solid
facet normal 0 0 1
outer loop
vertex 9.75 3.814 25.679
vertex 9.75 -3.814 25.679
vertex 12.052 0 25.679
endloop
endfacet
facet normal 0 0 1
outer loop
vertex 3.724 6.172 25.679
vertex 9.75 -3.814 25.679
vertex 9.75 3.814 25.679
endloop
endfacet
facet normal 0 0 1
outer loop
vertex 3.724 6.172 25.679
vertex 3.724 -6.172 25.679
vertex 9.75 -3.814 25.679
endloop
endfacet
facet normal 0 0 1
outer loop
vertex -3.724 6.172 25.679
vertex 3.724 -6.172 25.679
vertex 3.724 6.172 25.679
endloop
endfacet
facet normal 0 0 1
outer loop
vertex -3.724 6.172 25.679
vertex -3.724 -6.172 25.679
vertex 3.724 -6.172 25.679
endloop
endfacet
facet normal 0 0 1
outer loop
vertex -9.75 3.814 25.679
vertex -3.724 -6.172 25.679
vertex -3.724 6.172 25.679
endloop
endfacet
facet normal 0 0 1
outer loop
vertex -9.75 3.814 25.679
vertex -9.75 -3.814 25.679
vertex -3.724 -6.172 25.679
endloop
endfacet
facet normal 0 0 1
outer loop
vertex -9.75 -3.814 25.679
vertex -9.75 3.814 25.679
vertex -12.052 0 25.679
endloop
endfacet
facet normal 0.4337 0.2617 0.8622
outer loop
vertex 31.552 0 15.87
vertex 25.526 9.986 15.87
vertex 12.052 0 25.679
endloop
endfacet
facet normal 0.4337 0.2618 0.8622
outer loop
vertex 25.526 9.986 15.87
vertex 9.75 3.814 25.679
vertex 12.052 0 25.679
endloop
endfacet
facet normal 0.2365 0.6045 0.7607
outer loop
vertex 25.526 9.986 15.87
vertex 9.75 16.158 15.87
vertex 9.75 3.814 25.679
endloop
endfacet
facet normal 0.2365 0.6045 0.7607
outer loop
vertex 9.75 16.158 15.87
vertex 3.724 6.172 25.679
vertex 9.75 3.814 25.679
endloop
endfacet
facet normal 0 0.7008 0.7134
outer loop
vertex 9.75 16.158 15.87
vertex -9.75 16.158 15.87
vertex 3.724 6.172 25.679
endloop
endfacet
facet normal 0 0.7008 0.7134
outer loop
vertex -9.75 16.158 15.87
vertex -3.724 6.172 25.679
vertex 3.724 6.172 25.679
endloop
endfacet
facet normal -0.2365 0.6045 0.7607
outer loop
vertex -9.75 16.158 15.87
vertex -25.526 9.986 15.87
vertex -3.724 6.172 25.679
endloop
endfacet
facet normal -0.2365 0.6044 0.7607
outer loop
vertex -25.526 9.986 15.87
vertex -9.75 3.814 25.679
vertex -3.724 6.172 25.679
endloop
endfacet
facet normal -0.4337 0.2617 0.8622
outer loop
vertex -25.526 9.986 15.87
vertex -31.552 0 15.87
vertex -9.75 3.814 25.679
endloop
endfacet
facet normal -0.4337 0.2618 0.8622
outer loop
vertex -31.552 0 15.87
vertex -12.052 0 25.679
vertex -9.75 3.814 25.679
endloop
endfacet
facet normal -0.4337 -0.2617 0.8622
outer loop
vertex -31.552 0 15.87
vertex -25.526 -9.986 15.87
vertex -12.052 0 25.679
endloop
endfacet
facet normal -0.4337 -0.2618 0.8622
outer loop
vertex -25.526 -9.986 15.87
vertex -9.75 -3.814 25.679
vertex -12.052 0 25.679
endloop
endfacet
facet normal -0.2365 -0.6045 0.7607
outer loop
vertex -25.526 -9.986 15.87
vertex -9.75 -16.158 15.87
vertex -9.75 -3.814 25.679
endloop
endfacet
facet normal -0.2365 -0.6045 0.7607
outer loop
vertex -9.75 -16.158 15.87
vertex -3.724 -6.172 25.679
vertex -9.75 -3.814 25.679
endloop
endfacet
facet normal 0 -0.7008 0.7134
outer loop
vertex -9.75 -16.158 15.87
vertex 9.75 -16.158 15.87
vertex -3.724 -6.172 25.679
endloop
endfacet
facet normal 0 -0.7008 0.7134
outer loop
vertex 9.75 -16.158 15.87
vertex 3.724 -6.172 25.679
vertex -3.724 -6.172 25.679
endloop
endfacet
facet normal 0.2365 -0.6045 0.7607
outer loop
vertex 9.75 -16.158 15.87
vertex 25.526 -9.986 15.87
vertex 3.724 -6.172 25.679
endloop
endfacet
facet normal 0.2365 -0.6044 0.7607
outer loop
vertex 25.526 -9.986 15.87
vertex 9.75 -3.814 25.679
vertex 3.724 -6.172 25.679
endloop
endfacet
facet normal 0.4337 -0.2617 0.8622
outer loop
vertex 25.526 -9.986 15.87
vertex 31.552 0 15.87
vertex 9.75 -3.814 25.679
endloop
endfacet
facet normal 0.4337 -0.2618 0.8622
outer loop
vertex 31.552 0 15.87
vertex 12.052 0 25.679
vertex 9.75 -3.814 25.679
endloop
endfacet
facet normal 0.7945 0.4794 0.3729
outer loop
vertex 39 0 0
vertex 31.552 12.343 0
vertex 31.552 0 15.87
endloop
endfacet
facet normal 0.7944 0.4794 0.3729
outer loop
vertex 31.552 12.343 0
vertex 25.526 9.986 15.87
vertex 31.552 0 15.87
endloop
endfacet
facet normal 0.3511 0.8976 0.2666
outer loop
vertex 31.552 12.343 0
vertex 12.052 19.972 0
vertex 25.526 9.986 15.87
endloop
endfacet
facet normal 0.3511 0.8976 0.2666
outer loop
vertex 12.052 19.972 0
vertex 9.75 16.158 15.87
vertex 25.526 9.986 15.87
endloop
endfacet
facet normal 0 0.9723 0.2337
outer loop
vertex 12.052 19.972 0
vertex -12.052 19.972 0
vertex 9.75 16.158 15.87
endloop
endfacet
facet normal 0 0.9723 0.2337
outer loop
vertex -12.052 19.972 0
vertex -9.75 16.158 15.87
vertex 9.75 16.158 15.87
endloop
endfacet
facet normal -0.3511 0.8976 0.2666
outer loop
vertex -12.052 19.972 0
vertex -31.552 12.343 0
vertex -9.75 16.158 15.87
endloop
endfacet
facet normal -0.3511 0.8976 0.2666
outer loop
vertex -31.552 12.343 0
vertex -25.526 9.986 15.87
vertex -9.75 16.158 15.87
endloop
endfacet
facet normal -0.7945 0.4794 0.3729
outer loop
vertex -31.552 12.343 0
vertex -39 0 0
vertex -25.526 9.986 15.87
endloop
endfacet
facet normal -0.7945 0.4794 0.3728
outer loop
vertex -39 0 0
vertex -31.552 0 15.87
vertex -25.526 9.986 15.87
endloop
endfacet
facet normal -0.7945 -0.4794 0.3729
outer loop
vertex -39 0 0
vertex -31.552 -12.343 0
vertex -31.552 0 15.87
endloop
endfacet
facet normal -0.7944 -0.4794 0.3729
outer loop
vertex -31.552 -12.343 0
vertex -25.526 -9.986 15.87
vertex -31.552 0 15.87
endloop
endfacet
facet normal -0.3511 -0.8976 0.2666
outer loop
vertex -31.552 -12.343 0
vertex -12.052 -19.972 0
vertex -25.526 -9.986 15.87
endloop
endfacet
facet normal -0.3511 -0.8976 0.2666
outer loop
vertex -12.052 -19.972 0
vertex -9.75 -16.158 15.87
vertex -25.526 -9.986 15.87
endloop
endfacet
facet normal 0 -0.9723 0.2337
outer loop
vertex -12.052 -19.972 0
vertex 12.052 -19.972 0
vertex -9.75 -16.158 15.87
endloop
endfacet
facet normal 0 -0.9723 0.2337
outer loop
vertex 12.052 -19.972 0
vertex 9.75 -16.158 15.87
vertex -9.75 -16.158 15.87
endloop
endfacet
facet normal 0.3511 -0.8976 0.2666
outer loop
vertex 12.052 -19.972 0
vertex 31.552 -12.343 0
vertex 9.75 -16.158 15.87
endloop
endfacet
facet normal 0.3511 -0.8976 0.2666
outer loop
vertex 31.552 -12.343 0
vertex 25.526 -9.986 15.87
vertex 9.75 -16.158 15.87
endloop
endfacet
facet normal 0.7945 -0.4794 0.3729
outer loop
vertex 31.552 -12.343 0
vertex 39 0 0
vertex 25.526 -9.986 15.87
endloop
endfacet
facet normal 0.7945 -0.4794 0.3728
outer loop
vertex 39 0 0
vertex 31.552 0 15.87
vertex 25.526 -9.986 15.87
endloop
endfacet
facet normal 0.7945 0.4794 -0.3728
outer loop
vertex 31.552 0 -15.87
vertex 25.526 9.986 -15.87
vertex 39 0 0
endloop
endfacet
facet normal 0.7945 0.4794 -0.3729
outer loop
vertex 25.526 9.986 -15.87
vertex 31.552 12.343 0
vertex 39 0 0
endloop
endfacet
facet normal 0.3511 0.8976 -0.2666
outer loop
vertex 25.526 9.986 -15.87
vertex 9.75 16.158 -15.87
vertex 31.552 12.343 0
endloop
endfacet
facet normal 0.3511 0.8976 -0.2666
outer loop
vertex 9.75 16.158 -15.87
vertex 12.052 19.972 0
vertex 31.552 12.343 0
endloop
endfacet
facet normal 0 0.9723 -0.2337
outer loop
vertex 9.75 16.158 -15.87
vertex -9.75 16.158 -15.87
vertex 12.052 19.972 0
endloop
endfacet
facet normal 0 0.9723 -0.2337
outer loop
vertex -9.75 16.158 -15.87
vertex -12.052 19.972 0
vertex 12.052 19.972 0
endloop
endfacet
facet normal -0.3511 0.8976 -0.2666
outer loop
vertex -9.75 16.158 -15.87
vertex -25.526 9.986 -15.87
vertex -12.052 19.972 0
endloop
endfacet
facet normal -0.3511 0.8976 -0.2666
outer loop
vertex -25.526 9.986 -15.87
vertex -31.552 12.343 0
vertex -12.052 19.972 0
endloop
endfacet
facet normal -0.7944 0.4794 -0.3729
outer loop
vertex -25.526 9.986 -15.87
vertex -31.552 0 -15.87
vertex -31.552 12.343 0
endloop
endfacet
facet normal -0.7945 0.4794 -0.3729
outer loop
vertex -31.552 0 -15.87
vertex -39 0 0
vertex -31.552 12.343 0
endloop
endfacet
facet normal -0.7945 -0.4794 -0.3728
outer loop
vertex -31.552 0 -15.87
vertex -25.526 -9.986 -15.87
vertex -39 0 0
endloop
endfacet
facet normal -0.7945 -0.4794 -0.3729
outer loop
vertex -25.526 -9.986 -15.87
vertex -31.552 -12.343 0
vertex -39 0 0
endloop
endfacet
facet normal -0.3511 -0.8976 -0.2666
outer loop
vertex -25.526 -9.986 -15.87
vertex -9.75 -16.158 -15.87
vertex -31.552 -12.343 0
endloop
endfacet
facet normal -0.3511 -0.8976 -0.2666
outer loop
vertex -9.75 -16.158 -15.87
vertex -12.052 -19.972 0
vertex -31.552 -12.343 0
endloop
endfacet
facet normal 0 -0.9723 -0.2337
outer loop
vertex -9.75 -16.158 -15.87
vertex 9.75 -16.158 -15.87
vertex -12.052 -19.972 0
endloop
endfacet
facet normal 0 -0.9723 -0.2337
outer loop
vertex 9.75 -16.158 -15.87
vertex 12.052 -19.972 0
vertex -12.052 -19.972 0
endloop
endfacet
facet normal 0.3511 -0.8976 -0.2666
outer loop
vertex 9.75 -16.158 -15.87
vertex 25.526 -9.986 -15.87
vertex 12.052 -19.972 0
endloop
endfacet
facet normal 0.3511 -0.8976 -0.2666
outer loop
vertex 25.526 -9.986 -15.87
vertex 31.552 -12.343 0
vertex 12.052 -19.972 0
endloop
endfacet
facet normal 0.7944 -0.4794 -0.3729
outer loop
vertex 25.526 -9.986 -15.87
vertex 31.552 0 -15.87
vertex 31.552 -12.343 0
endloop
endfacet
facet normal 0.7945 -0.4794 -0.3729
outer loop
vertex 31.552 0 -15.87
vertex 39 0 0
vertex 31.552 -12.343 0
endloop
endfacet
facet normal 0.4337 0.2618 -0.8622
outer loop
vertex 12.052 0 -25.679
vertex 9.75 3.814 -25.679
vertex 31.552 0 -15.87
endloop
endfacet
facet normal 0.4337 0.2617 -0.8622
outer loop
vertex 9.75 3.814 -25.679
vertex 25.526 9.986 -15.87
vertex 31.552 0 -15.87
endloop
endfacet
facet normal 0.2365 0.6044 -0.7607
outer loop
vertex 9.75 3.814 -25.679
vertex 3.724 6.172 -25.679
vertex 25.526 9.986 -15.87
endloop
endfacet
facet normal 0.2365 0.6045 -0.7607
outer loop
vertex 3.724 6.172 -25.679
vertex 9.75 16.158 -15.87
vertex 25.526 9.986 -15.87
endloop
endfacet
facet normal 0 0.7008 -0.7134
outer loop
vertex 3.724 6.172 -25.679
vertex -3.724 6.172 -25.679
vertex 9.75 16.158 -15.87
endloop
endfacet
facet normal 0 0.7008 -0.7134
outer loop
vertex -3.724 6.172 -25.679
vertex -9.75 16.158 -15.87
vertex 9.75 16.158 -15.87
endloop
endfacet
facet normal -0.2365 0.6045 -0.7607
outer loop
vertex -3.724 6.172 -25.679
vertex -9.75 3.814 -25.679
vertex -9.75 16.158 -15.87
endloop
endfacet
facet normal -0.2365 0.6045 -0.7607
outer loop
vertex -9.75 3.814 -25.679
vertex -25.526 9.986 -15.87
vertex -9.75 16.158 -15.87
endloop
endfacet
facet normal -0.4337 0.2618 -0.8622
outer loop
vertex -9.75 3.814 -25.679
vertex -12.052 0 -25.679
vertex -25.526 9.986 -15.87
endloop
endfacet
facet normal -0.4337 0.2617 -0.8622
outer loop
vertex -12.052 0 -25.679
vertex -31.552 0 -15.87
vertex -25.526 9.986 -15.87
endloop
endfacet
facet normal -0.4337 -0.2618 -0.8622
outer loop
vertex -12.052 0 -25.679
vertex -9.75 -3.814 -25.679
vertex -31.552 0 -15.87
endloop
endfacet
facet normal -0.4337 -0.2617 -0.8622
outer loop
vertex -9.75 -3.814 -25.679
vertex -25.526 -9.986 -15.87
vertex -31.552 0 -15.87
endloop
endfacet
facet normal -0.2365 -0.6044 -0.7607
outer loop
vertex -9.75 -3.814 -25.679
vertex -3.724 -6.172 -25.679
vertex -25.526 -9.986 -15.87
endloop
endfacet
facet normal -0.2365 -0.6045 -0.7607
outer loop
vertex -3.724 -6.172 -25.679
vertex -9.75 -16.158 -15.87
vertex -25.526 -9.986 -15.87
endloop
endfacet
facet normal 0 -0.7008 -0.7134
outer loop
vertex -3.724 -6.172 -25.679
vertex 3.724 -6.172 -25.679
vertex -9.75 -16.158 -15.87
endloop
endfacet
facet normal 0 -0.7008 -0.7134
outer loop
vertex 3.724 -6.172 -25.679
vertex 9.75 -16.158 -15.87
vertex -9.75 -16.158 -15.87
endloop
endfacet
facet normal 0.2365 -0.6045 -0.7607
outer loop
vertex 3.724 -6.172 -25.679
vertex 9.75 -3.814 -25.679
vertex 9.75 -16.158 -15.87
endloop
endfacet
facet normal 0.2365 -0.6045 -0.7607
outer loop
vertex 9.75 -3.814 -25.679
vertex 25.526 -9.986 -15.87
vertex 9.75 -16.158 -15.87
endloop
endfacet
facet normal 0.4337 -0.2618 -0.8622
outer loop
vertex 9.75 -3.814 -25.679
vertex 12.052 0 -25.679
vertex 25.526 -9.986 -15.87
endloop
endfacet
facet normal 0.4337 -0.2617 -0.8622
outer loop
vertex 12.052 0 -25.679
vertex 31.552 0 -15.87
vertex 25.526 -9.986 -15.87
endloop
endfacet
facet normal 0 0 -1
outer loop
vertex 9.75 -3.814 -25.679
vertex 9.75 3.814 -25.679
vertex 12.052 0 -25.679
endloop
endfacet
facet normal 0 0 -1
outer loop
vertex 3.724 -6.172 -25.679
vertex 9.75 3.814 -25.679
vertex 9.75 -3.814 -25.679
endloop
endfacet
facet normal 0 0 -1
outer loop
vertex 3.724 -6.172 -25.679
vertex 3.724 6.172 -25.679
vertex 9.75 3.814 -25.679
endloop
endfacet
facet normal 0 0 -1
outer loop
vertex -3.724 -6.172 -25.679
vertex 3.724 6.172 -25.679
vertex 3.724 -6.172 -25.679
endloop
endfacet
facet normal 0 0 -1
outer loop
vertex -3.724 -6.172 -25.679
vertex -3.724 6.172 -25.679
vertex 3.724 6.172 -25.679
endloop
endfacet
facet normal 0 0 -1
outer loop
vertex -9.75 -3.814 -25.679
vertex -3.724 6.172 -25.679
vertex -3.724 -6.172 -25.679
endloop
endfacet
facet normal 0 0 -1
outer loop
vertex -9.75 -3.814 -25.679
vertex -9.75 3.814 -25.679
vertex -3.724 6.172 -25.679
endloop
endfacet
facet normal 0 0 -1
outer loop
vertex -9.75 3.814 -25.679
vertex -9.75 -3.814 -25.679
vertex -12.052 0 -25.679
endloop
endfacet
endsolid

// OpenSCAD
// Generated by SolidPython 1.0.1 on 2020-07-29 00:46:50


scale(v = [13, 7, 9]) {
	sphere(r = 3);
}
/***********************************************
*********      SolidPython code:      **********
************************************************
 
# import packages: SolidPython
from solid import *
from solid.utils import *
from itertools import chain, combinations, permutations


class Resize:

    def __init__(self, scad_file):
        self.scad_file = scad_file
        #self.scad_file = import_scad(scad_file)
        # cone/cylinder param:
        self.r1 = 0
        self.r2 = 0
        self.h = 0
        # rectangular prism param:
        self.w = 0
        self.l = 0
        # ellipse param:
        self.r = 0

    # import OpenScad code (file name corresponds to shape)


    # classify shape + parameters
    def assign(self, param1, param2, param3):
        if self.scad_file == 'cone.scad':
            self.r1 = param1
            self.r2 = param2
            self.h = param3
        elif self.scad_file == 'cylinder.scad':
            self.r1 = param1
            self.r2 = param2
            self.h = param3
        elif self.scad_file == 'rectangularPrism.scad':
            self.h = param1
            self.l = param2
            self.w = param3
        else:
            self.r = param1
            self.h = param2

    # resize parameters
    def iterate(self):
        x = range(3, 20, 2)
        i = 1
        if self.scad_file == 'cone.scad':
            tempList = list(permutations(x, 2))
            for temp in tempList:
                param1 = temp[0]
                param2 = temp[1]
                filepath = 'produced_scad_files/' + 'cone' + str(param1) + '_' + str(param2) + '_' + '.scad'
                scad_render_to_file(cylinder(h=param1, r1=param2, r2=0), filepath)

        elif self.scad_file == 'cylinder.scad':
            tempList = list(permutations(x, 3))
            for temp in tempList:
                param1 = temp[0]
                param2 = temp[1]
                filepath = 'produced_scad_files/' + 'cylinder' + str(param1) + '_' + str(param2) + '_' + '.scad'
                scad_render_to_file(cylinder(h=param1, r1=param2, r2=param2), filepath)

        elif self.scad_file == 'rectangularPrism.scad':
            tempList = list(permutations(x, 3))
            for temp in tempList:
                param1 = temp[0]
                param2 = temp[1]
                param3 = temp[2]
                filepath = 'produced_scad_files/' + 'rectangularPrism' + str(param1) + '_' + str(param2) + '_' + str(
                    param3) + '.scad'
                scad_render_to_file(cube(size=(param1, param2, param3)), filepath)

        elif self.scad_file == 'ellipse.scad':
            tempList = list(permutations(x, 4))
            for temp in tempList:
                param1 = temp[0]
                param2 = temp[1]
                param3 = temp[2]
                param4 = temp[3]
                filepath = 'produced_scad_files/' + 'ellipse' + str(param1) + '_' + str(param2) + '_' + str(param3) + '_' + str(param4) + '.scad'
                scad_render_to_file(scale([param1, param2, param3])(sphere(r=param4)), filepath)

    def render_to_scadfile(self):
        scad_render_to_file(scad, 'example.scad') 
 
************************************************/
